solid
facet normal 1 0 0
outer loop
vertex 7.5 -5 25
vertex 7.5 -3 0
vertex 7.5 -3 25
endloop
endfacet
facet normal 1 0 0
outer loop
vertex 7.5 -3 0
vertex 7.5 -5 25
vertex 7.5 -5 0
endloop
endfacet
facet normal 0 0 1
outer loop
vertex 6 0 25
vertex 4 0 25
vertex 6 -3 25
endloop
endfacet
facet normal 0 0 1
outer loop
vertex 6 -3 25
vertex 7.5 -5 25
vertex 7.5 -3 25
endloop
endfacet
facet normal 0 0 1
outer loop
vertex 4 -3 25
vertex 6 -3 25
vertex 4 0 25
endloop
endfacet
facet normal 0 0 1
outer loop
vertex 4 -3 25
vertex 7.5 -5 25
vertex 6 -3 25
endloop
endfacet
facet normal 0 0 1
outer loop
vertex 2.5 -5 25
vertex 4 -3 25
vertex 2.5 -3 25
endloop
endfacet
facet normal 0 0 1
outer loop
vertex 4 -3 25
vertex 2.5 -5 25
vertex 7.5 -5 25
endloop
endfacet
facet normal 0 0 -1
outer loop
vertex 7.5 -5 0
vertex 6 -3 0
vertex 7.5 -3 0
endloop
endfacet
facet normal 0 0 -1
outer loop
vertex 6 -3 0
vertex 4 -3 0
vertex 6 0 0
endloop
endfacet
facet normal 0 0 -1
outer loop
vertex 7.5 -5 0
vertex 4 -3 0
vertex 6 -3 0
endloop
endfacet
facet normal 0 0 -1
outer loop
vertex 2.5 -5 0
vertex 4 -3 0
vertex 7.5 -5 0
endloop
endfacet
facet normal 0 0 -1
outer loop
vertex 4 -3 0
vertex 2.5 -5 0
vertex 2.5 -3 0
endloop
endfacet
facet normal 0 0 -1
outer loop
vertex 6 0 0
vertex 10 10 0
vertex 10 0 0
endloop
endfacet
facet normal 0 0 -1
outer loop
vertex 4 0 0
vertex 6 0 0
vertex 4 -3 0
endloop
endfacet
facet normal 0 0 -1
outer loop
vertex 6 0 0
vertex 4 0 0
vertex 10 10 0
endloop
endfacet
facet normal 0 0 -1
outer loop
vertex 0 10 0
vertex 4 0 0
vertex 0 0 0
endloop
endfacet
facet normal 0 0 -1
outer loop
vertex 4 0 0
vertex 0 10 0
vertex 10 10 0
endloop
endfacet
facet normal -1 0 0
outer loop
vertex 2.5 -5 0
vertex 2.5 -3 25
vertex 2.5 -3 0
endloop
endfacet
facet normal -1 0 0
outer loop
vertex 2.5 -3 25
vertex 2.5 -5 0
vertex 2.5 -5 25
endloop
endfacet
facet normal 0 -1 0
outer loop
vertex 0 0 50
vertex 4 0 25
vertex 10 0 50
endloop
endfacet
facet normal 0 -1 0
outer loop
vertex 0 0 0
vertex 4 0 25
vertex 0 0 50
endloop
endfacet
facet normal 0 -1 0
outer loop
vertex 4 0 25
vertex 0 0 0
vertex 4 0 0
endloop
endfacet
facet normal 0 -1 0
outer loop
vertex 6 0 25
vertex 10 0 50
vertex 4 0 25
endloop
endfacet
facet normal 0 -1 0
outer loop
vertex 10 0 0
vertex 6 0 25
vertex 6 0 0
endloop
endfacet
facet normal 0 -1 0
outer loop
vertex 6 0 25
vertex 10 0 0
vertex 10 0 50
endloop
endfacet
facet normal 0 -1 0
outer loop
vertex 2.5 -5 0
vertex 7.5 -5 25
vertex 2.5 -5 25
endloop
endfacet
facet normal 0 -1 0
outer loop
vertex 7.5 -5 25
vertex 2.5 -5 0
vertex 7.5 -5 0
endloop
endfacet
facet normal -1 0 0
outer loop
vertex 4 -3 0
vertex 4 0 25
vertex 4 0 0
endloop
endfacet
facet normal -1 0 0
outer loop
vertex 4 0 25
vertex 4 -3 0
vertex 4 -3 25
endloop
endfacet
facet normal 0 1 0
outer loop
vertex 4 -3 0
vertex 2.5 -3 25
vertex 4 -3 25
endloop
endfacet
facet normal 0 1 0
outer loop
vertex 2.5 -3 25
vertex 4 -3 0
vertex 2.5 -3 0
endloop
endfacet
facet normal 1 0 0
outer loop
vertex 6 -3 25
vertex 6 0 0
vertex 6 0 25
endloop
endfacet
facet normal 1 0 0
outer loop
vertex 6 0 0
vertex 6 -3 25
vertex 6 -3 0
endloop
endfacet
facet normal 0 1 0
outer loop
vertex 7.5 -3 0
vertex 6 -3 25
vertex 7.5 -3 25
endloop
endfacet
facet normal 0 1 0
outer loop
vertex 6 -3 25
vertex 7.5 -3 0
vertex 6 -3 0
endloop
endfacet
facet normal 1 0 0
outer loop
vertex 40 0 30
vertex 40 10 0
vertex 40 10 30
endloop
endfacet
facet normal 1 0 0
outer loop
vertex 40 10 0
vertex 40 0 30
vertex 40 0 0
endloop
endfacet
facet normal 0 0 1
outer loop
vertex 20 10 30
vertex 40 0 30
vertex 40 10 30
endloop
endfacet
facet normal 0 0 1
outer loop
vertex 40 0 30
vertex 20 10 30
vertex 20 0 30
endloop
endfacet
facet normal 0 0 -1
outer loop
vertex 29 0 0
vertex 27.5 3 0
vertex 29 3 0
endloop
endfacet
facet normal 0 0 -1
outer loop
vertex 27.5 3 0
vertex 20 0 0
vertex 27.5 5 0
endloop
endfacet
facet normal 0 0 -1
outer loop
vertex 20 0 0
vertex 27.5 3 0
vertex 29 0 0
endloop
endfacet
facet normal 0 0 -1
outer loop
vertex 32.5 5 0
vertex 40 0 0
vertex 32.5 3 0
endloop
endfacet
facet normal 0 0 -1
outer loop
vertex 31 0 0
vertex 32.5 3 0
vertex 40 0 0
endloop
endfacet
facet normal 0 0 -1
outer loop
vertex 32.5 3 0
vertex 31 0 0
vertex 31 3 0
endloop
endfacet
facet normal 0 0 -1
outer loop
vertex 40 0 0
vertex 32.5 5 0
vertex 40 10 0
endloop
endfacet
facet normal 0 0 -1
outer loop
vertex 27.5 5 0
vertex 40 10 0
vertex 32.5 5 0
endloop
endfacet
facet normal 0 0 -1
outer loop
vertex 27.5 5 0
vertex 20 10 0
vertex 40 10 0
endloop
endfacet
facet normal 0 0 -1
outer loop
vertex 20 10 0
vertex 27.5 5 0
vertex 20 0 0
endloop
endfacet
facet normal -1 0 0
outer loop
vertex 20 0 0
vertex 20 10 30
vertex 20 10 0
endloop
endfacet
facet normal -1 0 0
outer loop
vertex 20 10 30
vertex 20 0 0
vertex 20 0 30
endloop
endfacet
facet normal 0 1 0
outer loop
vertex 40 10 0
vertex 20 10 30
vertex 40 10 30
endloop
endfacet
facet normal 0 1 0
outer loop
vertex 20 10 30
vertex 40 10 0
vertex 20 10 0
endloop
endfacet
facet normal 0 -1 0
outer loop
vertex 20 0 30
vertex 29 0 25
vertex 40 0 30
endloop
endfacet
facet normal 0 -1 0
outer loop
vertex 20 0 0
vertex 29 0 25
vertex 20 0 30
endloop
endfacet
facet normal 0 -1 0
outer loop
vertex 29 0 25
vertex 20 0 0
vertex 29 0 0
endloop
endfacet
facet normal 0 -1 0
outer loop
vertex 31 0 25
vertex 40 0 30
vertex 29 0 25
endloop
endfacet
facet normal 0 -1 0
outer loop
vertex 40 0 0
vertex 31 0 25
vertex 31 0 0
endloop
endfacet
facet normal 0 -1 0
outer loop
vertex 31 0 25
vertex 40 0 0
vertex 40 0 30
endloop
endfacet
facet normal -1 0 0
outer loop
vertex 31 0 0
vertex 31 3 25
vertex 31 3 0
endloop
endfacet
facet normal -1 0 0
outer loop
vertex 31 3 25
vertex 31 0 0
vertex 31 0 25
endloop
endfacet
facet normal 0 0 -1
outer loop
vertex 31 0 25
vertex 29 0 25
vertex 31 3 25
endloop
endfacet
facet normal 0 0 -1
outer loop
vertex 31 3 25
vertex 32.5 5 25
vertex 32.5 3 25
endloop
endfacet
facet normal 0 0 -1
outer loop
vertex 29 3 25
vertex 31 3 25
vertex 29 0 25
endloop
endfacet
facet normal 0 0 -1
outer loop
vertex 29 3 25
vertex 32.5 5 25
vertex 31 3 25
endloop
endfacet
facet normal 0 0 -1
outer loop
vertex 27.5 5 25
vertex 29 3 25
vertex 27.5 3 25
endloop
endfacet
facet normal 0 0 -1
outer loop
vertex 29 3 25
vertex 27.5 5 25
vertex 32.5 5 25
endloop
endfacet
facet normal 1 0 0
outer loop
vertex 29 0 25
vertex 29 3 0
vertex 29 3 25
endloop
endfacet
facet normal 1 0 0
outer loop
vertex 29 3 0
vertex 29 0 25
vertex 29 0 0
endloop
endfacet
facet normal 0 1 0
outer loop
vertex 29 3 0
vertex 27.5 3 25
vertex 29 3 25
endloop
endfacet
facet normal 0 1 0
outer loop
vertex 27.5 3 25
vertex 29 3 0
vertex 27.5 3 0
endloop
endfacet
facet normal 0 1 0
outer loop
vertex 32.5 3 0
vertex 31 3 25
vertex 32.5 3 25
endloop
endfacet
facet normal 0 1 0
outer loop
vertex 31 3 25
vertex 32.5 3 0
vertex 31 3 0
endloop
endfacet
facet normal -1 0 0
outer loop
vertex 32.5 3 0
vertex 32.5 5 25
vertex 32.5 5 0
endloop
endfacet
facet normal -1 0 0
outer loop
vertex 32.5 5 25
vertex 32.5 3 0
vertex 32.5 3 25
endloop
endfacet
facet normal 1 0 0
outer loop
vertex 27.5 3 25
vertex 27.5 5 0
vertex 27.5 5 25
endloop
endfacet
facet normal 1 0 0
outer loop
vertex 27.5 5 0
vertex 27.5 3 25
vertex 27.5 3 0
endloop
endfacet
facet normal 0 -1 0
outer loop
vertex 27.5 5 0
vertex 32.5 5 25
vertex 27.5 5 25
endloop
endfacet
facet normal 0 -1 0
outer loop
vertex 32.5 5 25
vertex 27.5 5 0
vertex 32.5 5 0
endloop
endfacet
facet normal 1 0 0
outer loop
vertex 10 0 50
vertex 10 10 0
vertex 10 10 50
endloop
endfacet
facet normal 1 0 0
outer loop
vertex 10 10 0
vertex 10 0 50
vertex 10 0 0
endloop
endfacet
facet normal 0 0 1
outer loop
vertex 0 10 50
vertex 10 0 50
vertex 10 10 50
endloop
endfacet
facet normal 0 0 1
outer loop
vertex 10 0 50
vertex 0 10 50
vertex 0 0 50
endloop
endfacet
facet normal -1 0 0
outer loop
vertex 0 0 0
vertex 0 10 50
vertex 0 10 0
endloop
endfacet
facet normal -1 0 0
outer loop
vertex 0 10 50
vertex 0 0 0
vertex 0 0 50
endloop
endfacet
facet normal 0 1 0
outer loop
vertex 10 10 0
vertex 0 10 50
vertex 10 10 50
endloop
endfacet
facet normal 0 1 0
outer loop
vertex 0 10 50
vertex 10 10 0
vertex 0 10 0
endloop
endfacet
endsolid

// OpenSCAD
cube([10, 10, 50]);

translate([2.5, -5, 0]) {
  difference() {
    cube([5, 5, 25]);

    translate([0, 2, 0]) {
      cube([1.5, 3, 25]);
    }

    translate([3.5, 2, 0]) {
      cube([1.5, 3, 25]);
    }
  }
}

translate([20, 0, 0]) {
  difference() {
    cube([20, 10, 30]);

    translate([9, 0, 0]) {
      cube([2, 3, 25]);
    }

    translate([7.5, 3, 0]) {
      cube([5, 2, 25]);
    }
  }
}

translate([60, 0, 0]) {
  linear_extrude(height = 25, center = false, convexity = 10, twist = 0, $fn = 100) {
    polygon(points = [[0,0], [5,0], [0,5]], paths = [0,1,2]);
  }
}
